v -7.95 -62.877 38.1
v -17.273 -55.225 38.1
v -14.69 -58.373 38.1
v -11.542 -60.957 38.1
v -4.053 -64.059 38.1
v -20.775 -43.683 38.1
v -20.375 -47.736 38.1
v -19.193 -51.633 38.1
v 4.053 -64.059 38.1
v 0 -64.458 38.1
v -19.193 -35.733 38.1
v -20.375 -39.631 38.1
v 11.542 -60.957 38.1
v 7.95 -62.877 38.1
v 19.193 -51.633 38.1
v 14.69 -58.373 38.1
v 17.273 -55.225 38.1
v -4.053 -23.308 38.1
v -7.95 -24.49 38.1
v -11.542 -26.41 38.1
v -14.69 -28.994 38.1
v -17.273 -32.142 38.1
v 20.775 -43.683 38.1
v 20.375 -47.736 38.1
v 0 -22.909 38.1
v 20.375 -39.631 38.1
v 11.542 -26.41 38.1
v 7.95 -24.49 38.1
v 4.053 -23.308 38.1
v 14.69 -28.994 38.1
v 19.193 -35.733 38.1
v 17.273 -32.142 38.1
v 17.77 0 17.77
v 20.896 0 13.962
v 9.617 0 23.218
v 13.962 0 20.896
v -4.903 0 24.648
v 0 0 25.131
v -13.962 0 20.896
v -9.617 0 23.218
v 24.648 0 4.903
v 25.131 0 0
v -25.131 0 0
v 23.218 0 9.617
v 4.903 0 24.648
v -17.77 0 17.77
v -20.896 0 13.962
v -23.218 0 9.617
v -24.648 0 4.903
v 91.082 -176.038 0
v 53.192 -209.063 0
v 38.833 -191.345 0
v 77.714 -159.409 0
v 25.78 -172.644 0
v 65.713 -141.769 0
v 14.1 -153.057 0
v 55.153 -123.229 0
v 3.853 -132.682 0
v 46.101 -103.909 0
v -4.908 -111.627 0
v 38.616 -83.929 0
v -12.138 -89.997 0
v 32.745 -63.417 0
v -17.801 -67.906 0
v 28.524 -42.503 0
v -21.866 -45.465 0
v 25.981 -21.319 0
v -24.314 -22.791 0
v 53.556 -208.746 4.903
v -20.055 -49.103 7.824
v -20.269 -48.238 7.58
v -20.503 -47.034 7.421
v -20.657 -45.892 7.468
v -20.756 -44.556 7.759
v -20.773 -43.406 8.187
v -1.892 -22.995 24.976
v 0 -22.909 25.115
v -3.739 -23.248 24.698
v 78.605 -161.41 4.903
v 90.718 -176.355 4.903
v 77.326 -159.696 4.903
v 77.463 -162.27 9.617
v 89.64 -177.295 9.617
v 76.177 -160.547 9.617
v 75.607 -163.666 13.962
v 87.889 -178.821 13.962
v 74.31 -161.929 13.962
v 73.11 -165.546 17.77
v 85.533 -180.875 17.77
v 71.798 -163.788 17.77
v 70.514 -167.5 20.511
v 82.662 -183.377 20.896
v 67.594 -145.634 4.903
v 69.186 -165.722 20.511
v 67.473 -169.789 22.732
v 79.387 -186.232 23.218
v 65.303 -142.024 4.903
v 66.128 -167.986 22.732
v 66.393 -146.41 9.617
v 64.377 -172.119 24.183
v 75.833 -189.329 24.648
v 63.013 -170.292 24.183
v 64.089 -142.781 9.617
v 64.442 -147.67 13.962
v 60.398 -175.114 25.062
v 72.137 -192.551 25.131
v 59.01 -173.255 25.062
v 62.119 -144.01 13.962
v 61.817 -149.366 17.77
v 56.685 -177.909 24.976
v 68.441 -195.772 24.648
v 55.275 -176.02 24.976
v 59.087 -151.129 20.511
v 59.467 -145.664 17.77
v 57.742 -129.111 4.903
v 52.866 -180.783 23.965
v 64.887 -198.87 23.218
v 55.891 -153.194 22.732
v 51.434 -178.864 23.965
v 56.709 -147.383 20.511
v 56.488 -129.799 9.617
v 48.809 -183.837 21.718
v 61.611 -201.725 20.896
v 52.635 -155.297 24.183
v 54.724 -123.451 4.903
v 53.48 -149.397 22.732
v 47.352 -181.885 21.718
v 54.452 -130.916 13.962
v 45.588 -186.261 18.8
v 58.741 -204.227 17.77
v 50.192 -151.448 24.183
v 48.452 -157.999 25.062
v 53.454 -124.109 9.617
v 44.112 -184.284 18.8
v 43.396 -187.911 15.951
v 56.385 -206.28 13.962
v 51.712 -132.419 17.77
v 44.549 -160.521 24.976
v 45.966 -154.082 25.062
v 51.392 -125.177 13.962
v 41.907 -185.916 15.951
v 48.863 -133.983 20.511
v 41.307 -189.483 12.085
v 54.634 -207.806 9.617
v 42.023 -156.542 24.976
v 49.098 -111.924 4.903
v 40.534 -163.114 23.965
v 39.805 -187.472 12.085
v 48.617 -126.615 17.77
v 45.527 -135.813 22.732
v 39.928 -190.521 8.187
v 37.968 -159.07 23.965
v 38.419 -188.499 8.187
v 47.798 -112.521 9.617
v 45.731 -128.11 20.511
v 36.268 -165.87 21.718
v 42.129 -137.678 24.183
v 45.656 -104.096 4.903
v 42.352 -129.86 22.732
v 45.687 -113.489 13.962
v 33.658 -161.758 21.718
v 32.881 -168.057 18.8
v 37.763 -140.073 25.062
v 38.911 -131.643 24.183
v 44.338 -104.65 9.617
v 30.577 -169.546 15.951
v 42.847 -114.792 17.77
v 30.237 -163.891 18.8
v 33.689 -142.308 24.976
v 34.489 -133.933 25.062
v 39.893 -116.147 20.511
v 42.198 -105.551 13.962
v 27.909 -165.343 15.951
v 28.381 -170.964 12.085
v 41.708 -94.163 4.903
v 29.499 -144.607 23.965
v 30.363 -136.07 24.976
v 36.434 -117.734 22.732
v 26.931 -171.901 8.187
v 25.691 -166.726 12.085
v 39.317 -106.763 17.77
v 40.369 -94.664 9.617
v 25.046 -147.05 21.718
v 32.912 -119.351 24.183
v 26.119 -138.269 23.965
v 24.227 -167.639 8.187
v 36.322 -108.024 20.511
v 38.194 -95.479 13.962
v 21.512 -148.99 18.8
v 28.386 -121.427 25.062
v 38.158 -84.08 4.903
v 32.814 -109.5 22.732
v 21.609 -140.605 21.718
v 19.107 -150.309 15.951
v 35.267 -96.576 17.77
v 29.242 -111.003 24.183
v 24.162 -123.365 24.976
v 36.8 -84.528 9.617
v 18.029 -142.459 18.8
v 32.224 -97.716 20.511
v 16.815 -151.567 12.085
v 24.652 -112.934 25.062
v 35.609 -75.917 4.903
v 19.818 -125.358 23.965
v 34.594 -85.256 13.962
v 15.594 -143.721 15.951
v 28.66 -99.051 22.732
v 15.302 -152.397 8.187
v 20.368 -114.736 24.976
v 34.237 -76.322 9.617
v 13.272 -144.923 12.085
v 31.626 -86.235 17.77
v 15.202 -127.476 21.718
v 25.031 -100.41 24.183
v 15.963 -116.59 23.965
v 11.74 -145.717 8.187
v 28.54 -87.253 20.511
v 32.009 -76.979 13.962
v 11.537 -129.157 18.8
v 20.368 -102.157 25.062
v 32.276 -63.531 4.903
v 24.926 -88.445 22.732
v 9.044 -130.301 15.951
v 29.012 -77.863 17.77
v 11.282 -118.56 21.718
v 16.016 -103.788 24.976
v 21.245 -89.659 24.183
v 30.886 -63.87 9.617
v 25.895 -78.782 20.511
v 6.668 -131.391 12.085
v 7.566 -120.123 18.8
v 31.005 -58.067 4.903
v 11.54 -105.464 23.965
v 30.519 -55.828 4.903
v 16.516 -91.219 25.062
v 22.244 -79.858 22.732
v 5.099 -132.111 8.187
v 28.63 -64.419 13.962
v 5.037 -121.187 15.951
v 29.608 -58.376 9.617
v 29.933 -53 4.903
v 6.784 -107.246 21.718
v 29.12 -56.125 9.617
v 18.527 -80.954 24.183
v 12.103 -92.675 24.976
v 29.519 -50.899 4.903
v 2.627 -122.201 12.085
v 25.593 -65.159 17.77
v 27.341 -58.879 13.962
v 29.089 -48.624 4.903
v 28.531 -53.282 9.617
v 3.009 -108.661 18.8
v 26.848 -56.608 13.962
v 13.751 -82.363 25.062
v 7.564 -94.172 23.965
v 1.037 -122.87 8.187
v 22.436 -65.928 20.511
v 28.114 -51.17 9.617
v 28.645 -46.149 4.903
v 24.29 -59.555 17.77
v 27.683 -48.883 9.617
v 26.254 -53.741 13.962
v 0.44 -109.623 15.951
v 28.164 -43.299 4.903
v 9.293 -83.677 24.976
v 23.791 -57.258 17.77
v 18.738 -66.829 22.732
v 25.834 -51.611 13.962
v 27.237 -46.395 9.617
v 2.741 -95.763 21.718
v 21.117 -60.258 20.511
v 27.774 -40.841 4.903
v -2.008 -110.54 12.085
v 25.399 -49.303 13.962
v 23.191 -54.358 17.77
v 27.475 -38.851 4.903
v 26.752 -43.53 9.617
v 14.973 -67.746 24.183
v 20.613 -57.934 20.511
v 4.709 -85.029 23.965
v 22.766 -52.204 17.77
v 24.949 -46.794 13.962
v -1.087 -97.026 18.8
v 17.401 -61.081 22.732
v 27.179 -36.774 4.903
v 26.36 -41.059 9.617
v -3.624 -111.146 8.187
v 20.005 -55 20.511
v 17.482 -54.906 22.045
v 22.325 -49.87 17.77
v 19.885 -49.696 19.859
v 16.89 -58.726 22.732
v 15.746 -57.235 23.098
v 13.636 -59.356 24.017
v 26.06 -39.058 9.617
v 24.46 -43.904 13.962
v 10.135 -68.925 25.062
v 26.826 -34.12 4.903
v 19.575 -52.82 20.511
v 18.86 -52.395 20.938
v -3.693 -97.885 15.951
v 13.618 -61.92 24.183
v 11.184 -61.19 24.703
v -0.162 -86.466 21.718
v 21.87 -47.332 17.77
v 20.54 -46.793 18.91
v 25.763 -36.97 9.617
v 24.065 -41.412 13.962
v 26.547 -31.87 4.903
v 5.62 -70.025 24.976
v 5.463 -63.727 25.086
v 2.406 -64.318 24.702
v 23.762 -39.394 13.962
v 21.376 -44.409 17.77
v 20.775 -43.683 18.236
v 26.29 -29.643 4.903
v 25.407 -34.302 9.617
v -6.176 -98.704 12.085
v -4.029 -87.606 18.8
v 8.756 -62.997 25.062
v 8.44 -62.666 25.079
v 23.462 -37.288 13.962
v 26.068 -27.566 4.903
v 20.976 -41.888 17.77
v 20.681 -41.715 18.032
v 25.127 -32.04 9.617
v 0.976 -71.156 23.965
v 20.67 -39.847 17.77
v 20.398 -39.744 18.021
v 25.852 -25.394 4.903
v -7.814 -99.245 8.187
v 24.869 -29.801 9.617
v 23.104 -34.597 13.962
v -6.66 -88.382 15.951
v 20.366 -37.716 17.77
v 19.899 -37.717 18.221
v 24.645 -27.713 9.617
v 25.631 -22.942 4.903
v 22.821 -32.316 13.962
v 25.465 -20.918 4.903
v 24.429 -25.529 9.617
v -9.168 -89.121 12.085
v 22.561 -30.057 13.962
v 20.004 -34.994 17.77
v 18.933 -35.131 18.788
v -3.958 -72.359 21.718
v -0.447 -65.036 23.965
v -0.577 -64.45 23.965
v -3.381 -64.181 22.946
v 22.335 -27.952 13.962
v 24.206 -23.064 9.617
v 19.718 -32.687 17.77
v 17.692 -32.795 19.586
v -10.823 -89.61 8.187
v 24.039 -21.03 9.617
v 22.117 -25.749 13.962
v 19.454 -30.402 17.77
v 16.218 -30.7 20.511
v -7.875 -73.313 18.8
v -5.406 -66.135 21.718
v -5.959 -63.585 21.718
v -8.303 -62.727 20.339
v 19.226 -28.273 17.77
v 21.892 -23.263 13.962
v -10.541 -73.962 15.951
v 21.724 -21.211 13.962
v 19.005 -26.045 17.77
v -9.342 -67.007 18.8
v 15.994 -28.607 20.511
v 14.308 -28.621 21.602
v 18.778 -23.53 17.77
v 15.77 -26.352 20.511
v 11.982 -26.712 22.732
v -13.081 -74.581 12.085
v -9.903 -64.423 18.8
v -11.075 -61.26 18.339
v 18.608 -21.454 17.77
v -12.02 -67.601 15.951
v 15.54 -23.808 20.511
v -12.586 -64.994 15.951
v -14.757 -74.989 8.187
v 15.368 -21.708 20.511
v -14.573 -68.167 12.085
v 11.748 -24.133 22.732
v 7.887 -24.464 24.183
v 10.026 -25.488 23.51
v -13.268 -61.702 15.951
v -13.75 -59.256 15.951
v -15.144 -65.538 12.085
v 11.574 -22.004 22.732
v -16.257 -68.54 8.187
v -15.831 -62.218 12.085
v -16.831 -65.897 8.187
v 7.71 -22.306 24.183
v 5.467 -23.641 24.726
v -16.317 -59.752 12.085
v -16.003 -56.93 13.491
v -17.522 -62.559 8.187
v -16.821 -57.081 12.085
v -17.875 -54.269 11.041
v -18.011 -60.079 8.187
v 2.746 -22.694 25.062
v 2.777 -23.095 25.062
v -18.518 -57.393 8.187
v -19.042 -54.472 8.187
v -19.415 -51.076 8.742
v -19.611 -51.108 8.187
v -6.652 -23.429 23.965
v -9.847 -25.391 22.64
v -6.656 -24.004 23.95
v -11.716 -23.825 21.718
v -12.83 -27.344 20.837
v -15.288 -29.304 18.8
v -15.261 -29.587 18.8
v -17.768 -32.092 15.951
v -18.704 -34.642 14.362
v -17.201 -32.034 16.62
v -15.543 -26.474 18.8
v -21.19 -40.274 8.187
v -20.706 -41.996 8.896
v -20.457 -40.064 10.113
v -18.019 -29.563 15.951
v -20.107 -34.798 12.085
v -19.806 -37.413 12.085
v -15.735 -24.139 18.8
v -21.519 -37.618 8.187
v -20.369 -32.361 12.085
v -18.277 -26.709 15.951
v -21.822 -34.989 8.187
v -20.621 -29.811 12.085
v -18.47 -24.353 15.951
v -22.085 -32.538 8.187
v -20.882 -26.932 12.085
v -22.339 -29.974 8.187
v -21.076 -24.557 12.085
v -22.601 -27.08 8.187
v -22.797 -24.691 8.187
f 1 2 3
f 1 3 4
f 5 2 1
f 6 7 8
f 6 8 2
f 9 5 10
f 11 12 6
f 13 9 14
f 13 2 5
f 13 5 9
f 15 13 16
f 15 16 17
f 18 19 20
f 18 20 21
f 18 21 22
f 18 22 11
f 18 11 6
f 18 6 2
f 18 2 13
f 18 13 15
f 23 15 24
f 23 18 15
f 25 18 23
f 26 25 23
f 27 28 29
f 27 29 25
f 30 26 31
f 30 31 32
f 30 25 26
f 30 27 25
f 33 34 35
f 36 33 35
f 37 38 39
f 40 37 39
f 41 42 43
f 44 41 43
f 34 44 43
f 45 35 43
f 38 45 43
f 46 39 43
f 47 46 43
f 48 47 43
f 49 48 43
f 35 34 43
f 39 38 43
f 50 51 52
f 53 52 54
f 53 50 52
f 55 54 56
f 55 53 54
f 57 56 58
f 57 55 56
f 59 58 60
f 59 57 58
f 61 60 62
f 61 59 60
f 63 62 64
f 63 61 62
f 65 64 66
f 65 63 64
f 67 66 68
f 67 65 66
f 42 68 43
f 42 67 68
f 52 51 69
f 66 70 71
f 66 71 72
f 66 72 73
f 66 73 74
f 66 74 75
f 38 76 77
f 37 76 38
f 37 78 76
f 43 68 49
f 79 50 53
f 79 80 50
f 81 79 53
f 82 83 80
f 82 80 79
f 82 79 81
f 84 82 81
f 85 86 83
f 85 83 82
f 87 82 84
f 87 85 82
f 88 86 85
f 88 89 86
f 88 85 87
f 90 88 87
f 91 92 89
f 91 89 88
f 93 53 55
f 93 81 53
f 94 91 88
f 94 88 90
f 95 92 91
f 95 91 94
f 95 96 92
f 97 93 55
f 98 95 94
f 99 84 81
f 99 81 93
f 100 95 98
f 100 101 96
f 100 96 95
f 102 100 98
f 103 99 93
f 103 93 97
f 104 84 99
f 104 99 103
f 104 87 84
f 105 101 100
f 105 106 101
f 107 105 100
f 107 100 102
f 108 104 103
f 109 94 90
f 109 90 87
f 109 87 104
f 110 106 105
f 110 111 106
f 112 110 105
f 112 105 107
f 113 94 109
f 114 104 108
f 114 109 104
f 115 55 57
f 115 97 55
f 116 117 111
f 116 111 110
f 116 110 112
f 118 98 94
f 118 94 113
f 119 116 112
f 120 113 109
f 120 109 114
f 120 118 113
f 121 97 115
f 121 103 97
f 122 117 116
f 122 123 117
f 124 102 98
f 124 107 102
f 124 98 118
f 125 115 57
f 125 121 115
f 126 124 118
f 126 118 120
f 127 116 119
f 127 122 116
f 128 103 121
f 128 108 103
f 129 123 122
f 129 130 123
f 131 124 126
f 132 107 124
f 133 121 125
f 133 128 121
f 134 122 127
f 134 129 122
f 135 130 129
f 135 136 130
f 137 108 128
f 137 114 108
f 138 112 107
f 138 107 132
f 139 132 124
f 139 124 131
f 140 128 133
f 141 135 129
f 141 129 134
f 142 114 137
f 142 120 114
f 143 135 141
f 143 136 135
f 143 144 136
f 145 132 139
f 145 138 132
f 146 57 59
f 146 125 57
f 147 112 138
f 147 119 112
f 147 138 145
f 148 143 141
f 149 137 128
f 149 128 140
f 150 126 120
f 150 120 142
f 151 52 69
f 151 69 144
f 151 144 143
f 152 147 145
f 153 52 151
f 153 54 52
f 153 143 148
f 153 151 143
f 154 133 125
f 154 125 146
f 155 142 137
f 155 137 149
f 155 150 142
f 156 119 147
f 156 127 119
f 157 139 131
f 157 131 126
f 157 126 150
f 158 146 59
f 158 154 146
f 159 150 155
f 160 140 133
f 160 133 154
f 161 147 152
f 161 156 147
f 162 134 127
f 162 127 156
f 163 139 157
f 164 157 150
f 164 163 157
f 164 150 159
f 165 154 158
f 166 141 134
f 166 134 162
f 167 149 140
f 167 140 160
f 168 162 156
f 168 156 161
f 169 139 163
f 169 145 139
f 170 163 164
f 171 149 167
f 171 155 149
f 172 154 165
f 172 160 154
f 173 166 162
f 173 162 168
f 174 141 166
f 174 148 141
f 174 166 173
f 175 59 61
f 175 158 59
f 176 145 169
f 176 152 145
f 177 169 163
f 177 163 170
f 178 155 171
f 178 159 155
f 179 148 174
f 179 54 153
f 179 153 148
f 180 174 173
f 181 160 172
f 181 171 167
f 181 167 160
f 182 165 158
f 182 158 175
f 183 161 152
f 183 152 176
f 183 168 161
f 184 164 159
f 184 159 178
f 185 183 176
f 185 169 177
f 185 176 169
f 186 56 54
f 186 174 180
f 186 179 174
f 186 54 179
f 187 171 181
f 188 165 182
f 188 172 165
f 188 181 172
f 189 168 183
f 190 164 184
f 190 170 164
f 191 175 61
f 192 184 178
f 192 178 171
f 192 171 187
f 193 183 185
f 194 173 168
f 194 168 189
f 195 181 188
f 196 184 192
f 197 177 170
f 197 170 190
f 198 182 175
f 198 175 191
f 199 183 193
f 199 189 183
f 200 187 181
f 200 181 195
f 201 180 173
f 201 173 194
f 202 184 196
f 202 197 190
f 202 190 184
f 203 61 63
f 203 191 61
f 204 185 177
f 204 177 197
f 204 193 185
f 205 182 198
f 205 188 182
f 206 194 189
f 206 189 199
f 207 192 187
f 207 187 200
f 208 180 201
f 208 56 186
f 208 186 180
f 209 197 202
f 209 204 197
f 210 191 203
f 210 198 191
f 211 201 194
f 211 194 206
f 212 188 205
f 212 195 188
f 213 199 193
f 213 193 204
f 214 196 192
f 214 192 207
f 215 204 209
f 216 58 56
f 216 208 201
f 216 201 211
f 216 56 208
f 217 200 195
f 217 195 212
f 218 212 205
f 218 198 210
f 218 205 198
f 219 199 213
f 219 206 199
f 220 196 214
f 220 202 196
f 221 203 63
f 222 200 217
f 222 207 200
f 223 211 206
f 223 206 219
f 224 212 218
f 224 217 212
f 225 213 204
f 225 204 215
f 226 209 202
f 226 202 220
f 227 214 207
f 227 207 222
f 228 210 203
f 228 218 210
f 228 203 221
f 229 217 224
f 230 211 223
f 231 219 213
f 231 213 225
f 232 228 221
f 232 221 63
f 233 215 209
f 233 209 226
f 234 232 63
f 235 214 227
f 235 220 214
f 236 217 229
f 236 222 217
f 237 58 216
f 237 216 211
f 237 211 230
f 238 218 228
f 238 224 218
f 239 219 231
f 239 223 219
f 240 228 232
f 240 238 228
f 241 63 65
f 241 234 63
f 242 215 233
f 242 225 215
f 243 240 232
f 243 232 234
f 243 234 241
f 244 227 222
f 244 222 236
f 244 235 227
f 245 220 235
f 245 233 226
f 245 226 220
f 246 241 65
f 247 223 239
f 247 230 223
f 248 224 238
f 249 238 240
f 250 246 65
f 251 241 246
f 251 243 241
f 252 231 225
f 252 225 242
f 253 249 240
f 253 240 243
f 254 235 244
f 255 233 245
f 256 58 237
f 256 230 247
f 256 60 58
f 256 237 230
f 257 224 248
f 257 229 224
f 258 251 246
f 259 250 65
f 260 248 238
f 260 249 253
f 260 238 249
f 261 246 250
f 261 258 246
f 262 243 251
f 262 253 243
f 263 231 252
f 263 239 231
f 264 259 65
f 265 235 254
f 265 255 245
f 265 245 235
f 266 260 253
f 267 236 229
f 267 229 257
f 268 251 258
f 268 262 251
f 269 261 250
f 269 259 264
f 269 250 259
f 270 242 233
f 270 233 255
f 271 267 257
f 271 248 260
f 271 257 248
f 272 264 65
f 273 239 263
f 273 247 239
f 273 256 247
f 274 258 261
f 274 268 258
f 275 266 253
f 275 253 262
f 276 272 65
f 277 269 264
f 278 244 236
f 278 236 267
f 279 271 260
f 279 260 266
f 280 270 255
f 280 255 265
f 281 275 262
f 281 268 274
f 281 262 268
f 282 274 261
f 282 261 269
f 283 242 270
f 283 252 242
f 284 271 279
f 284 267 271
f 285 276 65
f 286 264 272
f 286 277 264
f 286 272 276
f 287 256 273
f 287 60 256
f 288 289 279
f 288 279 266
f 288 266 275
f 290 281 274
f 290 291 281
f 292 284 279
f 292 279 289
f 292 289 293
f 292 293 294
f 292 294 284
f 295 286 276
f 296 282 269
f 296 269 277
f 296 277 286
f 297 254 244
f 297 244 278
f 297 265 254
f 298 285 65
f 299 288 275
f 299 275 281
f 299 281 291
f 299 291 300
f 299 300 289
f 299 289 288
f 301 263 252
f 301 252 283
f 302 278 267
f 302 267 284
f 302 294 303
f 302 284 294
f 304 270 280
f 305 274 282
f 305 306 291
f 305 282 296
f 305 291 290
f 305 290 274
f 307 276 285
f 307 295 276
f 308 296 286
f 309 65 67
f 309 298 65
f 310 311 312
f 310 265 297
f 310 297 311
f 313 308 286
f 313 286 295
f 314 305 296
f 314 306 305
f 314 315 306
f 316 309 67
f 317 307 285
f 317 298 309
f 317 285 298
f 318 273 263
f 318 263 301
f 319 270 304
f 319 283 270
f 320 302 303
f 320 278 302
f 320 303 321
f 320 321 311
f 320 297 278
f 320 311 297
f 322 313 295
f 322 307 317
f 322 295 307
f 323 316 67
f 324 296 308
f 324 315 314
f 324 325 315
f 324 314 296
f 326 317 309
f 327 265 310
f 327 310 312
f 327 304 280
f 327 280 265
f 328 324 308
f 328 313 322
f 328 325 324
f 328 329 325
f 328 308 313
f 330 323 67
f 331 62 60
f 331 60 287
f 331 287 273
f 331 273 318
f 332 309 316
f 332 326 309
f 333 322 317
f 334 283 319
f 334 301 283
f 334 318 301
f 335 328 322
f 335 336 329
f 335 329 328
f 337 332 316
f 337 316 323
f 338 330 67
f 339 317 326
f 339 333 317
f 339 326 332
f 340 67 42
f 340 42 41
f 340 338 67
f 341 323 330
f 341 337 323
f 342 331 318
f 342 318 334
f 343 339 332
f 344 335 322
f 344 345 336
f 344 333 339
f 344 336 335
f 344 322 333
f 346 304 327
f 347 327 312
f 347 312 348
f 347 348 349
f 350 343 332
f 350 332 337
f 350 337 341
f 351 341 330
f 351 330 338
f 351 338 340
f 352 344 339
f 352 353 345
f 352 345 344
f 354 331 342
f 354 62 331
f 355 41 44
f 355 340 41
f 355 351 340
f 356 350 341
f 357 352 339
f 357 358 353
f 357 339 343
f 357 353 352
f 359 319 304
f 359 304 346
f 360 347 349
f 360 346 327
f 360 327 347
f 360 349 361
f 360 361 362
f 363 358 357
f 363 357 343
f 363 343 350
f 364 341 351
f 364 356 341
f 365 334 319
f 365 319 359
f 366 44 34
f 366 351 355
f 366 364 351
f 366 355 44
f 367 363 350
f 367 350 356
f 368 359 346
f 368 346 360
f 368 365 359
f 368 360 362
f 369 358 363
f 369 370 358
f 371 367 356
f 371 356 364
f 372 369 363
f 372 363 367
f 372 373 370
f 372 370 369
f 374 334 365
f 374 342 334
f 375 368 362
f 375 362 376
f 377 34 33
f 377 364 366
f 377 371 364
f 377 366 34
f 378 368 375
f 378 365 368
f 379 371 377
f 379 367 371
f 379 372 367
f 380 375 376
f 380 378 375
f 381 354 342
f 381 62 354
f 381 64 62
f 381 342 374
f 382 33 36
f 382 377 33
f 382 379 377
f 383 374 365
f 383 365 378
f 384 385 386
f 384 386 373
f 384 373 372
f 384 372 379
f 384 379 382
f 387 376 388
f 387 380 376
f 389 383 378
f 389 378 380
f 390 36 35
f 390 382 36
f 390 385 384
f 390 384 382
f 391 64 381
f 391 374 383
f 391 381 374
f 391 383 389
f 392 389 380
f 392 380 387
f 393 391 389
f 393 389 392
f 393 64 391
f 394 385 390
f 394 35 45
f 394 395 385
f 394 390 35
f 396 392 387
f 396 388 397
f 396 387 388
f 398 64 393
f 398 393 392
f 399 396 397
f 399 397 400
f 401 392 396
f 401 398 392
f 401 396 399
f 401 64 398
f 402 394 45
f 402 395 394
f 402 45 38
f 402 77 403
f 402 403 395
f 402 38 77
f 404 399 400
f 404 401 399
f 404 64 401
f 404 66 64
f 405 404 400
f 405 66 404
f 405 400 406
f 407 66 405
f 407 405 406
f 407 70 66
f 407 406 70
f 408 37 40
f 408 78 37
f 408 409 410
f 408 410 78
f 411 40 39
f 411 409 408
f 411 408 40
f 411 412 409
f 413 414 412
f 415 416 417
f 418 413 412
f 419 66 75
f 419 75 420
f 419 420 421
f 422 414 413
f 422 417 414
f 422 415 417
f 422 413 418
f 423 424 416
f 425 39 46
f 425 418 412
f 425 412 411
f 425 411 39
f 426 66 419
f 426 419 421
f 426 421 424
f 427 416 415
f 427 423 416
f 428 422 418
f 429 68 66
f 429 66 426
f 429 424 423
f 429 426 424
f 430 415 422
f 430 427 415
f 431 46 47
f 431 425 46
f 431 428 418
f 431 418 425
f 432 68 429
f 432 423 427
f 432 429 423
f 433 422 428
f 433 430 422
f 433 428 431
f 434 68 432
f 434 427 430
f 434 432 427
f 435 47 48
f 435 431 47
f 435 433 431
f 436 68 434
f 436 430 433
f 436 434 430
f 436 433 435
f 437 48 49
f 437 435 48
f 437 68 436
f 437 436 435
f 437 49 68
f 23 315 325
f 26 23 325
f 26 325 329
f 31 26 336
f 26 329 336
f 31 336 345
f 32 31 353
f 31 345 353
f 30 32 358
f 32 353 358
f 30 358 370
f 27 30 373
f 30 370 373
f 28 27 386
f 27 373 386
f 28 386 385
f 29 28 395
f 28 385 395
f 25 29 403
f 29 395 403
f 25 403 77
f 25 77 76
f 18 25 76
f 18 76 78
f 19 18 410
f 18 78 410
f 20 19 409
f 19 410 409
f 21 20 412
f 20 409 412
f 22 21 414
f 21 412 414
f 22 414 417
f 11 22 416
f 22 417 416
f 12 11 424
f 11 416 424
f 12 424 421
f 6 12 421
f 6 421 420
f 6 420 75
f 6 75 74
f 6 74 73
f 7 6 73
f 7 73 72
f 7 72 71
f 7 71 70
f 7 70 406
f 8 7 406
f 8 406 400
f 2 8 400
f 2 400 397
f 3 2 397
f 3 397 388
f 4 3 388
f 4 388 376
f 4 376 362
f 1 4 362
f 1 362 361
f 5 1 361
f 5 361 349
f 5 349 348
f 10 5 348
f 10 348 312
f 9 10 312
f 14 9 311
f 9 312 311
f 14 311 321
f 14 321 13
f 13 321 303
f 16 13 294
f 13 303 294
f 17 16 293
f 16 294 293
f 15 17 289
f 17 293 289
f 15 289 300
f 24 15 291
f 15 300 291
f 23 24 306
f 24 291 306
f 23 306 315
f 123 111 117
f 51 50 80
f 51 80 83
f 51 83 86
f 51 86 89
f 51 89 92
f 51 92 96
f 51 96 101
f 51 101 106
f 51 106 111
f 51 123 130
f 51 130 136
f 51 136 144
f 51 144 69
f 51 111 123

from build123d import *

# Parameters (mm, degrees)
F1_DEPTH = 38.1


with BuildPart() as f1:
    # F0 (on Top) → F1 (new body)
    with BuildSketch(Plane.XY):
        with BuildLine():
            ThreePointArc((0, -22.908895), (-14.689808, -58.373229), (20.774525, -43.683421))
            ThreePointArc((20.774525, -43.683421), (14.689808, -28.993613), (0, -22.908895))
        make_face()
    extrude(amount=F1_DEPTH)

    # F4: sweep along a path in F2
    with BuildLine(Plane.XY) as f4_path:
        ThreePointArc((72.136711, -192.550732), (18.626108, -102.809884), (0, 0))
    # F3 (on Front) → F4 (sweep)
    with BuildSketch(Plane.XZ):
        with BuildLine():
            Line((-25.131127, 0), (25.131127, 0))
            ThreePointArc((25.131127, 0), (0, 25.131127), (-25.131127, 0))
        make_face()
    sweep(path=f4_path.line)


solid = f1.part
